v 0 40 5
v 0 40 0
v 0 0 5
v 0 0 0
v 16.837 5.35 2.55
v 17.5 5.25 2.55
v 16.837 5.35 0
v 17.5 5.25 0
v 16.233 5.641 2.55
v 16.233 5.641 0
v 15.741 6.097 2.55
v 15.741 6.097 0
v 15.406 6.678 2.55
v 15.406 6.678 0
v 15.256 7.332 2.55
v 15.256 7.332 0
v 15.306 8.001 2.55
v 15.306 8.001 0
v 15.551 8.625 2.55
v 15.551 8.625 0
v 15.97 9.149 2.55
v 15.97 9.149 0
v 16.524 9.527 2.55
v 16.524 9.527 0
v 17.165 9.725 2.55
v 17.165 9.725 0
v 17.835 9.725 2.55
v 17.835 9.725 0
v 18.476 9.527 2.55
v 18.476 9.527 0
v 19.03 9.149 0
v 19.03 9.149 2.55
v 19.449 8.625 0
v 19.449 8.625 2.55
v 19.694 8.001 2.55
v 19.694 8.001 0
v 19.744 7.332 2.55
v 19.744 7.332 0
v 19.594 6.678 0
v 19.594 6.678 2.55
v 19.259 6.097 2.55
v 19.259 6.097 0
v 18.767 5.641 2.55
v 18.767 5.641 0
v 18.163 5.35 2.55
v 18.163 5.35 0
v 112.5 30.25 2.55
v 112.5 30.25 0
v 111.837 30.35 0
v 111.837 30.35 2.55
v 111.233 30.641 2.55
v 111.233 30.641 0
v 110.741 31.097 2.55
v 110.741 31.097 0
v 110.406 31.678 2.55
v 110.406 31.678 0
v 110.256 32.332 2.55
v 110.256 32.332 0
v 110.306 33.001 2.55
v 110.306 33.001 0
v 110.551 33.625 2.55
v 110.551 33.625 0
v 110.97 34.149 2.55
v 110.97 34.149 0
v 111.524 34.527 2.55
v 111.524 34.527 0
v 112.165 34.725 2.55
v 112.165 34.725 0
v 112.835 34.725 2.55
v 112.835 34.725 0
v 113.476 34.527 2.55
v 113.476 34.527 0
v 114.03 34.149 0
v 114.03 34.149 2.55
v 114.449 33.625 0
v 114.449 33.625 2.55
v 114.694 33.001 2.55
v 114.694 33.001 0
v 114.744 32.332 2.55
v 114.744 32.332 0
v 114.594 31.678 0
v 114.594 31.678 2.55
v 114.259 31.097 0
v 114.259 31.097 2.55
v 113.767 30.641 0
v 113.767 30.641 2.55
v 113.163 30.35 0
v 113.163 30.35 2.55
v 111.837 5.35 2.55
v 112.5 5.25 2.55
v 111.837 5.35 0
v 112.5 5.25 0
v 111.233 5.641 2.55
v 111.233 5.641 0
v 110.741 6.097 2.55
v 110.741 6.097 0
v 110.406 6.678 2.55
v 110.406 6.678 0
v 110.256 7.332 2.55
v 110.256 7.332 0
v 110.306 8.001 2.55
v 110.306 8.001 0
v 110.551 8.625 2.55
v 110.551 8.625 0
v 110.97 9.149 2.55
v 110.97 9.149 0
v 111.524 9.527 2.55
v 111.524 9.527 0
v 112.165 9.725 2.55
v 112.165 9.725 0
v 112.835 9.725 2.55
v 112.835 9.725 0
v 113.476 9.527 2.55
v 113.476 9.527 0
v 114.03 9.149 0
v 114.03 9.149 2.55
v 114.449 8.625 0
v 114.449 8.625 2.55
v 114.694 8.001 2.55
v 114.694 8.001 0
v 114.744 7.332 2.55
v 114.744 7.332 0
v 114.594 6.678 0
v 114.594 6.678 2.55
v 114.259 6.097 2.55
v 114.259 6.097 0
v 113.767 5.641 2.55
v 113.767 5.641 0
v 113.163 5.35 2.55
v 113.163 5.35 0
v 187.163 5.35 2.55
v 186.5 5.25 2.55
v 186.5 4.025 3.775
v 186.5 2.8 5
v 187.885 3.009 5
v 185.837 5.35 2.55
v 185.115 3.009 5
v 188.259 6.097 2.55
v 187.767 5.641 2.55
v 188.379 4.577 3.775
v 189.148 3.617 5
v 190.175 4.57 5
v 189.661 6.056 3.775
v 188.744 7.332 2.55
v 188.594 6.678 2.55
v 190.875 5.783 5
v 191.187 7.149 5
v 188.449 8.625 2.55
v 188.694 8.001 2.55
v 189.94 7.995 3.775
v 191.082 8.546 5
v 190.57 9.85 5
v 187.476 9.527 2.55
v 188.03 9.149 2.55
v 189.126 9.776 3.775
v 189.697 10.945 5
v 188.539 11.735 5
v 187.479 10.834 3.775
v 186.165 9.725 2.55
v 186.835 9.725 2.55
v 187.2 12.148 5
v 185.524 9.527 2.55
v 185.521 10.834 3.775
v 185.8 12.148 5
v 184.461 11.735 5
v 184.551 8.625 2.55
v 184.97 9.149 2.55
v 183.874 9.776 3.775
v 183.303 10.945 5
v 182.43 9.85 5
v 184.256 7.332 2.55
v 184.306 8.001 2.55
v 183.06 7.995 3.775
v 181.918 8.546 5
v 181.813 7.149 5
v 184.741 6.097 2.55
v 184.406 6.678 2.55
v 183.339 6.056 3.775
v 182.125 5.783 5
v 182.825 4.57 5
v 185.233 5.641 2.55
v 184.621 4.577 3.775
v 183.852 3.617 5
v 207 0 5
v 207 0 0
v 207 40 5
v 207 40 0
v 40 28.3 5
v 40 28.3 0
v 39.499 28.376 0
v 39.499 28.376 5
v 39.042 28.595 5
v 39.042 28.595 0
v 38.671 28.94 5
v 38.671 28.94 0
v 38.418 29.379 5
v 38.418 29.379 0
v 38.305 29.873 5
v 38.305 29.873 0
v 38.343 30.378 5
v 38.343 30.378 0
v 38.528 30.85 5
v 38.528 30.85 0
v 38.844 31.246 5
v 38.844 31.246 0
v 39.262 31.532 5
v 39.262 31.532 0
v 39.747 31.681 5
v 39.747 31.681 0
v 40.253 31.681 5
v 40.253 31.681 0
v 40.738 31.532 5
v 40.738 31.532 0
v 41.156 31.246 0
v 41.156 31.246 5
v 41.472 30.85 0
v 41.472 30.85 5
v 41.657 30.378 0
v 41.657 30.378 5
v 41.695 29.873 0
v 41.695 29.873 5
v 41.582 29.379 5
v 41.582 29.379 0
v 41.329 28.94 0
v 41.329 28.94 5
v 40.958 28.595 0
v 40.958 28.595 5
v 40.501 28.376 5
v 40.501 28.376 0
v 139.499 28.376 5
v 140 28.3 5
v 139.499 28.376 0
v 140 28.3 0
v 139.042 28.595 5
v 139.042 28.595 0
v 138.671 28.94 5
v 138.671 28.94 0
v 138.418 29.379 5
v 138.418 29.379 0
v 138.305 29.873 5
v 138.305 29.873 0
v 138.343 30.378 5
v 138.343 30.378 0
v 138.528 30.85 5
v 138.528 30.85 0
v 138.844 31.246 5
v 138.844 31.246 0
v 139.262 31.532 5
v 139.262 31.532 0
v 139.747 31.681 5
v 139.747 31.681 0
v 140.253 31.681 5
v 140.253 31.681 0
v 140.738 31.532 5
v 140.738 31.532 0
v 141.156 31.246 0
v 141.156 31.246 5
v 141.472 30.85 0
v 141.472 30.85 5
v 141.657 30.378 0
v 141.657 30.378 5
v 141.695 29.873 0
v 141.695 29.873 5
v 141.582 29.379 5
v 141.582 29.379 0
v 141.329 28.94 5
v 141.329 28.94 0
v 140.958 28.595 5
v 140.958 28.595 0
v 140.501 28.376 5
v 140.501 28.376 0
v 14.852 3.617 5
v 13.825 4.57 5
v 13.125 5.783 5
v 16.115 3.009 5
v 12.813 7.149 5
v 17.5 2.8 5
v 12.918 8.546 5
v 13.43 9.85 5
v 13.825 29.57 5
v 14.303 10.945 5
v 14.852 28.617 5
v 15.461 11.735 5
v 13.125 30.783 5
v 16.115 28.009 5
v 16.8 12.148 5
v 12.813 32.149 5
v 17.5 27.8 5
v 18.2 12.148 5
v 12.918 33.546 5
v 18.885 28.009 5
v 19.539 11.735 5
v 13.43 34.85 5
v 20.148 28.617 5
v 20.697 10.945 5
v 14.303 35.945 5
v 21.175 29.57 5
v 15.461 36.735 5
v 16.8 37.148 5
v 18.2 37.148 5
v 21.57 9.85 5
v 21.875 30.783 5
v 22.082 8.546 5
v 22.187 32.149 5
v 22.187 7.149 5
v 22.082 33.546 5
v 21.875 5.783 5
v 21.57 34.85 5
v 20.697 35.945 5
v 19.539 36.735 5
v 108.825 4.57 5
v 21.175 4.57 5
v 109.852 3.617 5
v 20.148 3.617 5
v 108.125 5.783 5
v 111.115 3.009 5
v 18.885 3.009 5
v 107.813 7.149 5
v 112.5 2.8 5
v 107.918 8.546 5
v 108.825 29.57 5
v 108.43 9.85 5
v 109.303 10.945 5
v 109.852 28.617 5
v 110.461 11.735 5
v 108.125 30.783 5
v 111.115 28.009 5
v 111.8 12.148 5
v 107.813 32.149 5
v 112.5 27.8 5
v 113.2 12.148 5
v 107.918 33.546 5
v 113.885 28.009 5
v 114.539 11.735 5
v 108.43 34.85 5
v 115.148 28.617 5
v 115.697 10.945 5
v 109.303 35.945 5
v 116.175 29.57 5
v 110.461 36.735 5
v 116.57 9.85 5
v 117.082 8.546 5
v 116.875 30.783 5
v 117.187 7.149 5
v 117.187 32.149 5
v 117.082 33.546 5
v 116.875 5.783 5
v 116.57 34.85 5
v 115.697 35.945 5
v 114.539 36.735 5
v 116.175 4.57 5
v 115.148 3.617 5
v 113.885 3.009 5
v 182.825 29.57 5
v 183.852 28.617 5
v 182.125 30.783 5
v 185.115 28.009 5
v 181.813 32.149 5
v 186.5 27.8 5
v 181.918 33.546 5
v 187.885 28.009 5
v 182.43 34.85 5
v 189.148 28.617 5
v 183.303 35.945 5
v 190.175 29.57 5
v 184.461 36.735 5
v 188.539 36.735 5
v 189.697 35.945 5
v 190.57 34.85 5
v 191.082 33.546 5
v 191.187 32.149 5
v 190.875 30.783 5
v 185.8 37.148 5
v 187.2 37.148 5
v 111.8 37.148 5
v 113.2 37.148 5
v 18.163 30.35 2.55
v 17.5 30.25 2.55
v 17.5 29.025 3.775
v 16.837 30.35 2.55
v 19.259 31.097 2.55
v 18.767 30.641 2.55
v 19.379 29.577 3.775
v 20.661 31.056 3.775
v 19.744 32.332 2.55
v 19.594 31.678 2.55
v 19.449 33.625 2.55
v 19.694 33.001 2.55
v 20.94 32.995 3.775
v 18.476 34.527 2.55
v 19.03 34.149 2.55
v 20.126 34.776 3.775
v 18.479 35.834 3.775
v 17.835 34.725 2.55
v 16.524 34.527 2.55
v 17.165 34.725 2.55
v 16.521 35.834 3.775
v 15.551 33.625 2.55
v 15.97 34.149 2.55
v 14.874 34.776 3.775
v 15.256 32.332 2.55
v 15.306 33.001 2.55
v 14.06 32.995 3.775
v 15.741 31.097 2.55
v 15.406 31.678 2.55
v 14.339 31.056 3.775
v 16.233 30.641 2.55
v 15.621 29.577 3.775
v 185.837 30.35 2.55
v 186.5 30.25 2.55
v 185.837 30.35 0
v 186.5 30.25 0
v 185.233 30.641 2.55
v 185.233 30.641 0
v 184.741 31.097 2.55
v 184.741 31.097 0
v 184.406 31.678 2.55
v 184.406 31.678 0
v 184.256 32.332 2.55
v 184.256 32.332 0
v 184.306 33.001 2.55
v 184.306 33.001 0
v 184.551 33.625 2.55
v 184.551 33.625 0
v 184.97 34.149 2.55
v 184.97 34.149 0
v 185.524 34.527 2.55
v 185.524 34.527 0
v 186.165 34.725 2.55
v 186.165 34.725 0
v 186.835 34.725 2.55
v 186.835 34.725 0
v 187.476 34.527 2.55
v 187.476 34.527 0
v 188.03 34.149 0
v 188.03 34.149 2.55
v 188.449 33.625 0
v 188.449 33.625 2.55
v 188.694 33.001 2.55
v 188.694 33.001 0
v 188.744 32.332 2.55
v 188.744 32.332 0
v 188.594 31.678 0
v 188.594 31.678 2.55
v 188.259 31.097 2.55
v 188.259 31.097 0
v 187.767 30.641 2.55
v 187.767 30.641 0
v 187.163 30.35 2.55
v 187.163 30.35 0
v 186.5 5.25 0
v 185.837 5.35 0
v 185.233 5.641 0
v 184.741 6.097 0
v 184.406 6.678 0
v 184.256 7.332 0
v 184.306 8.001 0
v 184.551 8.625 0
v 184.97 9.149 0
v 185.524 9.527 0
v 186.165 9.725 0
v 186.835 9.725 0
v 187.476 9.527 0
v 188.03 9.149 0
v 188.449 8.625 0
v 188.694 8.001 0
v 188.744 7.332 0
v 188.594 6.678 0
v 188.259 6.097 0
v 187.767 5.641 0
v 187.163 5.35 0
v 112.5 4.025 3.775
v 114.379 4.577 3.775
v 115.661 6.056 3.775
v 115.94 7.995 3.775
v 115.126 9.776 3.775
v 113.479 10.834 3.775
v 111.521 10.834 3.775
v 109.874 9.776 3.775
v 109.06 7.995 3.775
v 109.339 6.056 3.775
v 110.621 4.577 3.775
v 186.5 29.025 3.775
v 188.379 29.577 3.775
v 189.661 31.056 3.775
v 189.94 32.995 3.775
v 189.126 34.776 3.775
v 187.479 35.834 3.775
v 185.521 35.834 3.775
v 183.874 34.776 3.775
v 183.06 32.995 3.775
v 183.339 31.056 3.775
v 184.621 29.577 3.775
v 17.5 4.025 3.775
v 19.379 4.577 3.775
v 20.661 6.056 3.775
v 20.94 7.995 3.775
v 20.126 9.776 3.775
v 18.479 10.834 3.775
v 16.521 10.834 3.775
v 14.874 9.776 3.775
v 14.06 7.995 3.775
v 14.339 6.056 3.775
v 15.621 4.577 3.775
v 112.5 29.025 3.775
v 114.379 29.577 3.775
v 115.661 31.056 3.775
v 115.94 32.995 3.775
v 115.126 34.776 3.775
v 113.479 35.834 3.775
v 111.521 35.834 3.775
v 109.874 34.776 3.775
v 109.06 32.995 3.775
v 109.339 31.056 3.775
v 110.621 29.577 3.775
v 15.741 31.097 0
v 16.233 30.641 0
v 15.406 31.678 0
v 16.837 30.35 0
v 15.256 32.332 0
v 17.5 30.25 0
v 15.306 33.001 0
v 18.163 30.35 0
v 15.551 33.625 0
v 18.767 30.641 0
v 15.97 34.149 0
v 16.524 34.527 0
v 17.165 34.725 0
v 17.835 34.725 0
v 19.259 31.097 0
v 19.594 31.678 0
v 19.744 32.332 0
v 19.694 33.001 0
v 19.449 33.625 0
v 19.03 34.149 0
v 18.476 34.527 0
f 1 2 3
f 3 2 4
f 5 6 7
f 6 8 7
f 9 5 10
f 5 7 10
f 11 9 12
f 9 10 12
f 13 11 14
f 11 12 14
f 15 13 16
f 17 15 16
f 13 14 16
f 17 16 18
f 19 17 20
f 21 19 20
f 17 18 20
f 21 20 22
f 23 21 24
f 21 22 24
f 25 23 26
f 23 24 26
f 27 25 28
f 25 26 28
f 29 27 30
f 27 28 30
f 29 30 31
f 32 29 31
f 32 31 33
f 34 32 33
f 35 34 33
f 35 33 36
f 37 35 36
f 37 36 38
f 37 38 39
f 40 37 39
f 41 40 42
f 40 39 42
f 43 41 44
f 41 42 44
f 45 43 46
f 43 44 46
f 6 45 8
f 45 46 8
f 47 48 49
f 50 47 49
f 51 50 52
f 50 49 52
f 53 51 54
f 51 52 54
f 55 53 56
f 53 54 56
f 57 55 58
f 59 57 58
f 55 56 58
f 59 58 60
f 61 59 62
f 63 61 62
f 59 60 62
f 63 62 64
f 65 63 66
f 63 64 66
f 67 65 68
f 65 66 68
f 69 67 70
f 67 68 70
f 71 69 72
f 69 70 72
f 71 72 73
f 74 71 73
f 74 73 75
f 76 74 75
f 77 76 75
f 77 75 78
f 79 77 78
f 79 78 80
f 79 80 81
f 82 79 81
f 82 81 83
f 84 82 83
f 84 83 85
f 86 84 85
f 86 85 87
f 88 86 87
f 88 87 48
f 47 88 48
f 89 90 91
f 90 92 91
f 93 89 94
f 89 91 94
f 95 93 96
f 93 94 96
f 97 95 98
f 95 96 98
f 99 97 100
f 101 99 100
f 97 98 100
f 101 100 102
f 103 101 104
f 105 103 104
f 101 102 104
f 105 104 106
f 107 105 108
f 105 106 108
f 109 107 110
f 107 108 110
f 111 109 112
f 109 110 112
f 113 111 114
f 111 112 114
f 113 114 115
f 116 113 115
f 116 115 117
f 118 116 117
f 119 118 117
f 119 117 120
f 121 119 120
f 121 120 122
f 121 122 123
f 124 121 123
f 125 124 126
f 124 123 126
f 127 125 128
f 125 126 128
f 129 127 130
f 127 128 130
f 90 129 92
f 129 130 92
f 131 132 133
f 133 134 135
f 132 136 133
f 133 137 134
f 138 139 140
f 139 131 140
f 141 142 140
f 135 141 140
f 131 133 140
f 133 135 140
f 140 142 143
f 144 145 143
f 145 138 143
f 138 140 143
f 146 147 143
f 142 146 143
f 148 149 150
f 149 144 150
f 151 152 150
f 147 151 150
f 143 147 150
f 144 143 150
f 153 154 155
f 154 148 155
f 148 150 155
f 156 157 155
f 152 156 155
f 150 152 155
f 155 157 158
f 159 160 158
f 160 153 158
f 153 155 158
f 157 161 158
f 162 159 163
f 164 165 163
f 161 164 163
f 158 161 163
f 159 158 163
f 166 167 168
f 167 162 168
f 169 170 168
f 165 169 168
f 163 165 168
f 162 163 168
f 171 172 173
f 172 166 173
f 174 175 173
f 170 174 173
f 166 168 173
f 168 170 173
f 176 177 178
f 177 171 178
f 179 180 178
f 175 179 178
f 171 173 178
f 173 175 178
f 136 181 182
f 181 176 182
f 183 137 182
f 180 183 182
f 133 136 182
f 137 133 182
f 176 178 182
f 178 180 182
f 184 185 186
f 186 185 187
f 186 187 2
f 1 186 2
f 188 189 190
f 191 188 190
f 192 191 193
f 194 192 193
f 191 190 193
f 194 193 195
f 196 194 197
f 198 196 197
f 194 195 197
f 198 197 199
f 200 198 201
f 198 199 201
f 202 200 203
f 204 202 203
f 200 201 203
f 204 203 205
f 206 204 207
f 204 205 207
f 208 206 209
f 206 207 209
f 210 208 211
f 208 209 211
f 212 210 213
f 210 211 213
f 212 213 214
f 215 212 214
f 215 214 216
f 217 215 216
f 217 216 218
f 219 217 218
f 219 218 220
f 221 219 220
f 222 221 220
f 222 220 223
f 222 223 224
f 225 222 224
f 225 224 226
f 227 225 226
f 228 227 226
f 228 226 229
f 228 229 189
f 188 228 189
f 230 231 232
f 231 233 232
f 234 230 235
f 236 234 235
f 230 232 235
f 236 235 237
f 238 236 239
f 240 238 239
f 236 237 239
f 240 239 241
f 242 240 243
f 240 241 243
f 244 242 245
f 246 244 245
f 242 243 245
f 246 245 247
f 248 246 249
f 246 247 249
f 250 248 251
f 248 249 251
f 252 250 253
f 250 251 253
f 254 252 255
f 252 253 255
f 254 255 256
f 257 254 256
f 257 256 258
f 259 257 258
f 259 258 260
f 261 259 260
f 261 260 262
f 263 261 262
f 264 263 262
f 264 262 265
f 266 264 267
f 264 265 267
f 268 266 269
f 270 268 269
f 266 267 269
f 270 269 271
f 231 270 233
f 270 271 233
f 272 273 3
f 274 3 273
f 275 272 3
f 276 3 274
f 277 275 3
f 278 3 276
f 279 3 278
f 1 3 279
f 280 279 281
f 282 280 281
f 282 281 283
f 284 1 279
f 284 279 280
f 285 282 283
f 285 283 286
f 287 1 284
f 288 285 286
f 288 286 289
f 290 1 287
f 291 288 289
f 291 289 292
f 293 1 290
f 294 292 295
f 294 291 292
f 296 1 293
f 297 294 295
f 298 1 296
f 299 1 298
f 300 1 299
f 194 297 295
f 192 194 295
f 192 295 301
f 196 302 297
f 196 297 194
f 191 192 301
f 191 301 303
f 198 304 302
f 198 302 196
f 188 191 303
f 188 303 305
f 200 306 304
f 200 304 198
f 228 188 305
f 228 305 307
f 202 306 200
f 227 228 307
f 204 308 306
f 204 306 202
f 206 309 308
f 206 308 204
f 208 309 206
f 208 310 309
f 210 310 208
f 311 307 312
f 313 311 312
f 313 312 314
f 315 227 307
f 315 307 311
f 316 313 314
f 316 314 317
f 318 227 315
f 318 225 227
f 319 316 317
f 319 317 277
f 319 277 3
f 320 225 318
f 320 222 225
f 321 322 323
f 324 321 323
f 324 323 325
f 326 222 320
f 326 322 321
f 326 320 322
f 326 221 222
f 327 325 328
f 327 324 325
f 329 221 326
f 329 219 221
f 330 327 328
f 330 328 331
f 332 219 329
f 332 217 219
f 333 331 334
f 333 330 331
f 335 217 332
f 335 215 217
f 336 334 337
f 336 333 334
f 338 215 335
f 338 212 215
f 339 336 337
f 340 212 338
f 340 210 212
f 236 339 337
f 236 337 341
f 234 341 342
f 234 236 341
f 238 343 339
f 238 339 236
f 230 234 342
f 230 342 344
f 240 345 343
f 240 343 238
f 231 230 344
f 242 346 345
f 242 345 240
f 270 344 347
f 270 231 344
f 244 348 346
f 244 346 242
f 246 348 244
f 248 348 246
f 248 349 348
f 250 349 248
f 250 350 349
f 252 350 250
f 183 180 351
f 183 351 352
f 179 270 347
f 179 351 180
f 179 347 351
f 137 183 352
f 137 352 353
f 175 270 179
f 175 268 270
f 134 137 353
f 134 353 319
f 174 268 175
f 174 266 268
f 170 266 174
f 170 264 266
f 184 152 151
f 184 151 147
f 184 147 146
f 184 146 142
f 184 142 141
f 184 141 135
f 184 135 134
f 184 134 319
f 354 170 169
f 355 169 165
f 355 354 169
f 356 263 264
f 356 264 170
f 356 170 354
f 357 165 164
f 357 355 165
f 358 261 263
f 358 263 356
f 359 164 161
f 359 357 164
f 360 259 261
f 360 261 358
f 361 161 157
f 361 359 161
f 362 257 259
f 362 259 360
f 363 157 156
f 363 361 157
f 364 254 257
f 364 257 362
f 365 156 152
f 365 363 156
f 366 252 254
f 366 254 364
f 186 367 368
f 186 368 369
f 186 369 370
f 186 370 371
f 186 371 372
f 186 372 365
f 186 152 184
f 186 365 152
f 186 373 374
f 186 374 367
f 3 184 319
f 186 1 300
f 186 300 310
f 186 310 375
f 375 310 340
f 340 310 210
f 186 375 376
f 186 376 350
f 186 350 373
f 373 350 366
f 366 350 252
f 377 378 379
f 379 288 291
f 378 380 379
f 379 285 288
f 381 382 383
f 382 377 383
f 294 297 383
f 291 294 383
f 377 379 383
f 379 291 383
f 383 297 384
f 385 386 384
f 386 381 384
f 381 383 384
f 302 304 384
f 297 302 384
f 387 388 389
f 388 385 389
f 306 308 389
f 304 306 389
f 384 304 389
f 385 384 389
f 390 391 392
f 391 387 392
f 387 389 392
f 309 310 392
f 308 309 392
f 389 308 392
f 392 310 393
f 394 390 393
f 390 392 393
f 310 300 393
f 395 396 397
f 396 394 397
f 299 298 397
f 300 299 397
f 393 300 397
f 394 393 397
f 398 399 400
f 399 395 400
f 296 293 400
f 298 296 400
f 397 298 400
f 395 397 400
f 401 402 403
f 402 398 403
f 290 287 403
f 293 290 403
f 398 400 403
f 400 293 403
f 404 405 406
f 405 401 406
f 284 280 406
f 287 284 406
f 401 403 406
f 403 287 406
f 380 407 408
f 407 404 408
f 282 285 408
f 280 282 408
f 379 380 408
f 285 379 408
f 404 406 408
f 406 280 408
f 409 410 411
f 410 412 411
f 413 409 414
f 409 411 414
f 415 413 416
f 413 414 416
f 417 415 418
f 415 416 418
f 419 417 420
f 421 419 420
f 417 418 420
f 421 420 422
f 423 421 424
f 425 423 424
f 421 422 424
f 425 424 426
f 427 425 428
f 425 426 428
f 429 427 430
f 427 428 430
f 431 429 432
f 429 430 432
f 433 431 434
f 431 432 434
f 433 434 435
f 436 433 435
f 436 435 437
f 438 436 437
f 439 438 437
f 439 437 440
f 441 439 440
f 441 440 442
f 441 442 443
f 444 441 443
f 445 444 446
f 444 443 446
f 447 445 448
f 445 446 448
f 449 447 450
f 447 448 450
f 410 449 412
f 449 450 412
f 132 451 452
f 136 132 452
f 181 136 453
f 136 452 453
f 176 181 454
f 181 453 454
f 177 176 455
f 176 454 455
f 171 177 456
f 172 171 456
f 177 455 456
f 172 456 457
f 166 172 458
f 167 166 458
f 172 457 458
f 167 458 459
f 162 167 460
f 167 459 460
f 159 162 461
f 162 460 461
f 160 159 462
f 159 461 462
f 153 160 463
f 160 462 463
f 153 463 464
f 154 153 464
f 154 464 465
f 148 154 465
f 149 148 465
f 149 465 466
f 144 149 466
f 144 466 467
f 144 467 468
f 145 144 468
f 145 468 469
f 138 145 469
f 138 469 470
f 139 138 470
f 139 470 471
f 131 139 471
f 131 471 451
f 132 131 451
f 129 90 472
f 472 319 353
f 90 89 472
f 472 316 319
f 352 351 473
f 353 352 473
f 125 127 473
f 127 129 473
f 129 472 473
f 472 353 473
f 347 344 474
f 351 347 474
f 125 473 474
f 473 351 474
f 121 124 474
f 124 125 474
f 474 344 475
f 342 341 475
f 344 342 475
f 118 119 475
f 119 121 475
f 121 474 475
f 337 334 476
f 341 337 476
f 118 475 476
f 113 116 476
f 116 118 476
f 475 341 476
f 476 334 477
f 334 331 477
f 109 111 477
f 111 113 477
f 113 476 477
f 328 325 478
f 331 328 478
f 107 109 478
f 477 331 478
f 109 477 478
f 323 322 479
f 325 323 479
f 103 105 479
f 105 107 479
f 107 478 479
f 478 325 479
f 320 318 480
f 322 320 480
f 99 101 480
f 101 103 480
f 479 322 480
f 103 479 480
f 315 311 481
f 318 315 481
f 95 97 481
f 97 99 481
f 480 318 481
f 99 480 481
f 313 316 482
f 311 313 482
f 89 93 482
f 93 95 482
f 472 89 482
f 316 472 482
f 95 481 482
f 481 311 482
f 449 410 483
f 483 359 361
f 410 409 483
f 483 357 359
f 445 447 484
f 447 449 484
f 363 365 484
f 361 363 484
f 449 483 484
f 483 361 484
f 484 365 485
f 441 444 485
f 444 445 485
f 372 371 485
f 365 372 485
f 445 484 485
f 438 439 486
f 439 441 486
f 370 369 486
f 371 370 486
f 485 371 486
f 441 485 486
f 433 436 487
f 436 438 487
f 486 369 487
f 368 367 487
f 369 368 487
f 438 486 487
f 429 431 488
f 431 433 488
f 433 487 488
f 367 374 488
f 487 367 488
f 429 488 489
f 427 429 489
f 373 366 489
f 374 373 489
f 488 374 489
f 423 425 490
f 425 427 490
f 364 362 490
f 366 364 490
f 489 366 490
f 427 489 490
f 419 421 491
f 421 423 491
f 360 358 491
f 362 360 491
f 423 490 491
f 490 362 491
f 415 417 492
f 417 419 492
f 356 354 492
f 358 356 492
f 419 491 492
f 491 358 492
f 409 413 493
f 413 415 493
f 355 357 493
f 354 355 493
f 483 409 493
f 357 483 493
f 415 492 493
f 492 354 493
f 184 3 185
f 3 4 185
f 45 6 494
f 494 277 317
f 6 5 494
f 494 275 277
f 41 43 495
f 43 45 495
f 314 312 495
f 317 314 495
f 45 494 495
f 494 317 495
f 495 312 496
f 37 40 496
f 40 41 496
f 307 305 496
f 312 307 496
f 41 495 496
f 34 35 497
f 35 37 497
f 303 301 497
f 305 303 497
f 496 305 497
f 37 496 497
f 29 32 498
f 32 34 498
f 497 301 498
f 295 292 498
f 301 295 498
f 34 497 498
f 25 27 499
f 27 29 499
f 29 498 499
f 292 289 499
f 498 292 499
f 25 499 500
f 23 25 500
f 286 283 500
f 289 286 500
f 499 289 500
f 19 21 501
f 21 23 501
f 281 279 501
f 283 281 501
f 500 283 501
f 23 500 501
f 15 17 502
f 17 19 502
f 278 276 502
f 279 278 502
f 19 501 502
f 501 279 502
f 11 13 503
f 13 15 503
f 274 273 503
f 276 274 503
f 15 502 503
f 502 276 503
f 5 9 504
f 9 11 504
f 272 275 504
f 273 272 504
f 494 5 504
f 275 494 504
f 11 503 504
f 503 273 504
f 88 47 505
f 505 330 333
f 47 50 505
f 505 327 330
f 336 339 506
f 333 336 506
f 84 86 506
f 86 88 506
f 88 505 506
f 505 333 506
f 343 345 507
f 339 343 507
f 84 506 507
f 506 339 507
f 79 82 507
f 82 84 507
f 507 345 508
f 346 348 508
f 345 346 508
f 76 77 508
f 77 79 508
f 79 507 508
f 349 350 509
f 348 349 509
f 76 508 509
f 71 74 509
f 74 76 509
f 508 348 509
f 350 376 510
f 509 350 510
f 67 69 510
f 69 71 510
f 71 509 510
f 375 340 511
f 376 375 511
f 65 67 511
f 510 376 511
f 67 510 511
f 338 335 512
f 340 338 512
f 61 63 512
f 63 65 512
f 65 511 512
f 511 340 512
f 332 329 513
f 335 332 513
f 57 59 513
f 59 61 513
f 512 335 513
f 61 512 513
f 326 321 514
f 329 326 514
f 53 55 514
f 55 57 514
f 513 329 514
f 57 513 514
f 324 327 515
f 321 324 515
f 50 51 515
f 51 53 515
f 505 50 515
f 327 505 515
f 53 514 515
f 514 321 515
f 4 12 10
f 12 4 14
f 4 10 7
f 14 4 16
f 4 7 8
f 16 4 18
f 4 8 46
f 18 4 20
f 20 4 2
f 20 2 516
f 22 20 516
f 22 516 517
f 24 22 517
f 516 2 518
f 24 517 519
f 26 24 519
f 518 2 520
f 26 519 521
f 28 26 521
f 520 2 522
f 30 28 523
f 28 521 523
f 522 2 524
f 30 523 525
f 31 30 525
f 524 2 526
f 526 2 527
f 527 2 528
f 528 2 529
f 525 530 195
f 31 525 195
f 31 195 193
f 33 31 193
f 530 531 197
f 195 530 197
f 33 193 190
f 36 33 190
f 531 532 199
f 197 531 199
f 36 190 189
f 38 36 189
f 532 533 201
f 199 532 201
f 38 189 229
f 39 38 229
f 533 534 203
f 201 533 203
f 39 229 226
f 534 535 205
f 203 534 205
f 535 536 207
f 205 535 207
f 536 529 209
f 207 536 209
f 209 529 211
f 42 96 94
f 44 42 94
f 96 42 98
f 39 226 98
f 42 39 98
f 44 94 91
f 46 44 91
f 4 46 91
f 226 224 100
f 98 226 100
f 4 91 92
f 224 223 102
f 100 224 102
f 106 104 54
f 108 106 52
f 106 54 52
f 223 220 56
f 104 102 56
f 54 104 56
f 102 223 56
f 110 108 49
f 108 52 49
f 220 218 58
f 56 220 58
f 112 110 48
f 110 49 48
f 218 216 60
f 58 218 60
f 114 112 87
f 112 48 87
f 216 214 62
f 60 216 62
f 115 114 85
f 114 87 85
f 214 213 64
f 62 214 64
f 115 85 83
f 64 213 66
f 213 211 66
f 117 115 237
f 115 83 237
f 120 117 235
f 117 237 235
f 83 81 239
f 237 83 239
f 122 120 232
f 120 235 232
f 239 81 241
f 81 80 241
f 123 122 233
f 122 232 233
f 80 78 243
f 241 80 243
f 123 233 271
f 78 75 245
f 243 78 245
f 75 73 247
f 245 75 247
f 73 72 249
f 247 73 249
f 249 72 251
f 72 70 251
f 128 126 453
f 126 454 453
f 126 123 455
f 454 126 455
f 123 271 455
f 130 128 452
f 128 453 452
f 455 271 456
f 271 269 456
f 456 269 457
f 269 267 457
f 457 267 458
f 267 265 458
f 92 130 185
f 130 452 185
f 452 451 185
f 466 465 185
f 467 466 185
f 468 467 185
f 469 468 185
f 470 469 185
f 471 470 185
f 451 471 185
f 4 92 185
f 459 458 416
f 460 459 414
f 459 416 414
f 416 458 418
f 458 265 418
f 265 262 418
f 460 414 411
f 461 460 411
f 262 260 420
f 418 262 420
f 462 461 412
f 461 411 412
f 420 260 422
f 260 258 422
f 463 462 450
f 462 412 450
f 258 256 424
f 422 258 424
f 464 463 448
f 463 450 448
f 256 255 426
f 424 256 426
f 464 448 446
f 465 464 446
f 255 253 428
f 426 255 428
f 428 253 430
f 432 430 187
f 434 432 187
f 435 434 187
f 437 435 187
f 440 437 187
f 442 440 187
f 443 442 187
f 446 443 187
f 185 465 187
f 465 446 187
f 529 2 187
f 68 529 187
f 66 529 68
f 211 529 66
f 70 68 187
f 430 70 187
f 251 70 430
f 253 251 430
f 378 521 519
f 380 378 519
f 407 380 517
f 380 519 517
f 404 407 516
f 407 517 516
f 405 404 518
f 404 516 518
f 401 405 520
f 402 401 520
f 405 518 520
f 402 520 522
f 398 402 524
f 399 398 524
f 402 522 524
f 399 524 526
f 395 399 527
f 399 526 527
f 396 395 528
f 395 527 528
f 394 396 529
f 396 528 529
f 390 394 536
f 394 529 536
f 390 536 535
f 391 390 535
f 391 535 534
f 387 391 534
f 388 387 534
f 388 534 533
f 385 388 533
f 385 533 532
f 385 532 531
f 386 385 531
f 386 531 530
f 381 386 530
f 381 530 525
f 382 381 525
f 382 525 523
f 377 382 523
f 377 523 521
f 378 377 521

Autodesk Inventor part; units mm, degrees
ref_plane "YZ Plane" through (0, 0, 0) normal (1, 0, 0) x (0, 1, 0)
ref_plane "XZ Plane" through (0, 0, 0) normal (0, 1, 0) x (-1, 0, 0)
ref_plane "XY Plane" through (0, 0, 0) normal (0, 0, 1) x (1, 0, 0)
sketch "Sketch1" plane through (0, 0, 0) normal (0, 0, 1) x (1, 0, 0)
  line L0 (0, 0) -> (207, 0)
  line L1 (207, 0) -> (207, 40)
  line L2 (207, 40) -> (0, 40)
  line L3 (0, 40) -> (0, 0)
  dimension "d0" = 207
  dimension "d1" = 40
extrude "Extrusion1" add sketch "Sketch1" along normal blind 5
sketch "Sketch2" plane through (0, 0, 5) normal (0, 0, 1) x (1, 0, 0)
  line L0 (207, 40) -> (0, 40) projected
  line L1 (0, 0) -> (207, 0) projected
  line L2 (0, 40) -> (0, 0) projected
  point P0 (17.5, 32.5)
  point P1 (17.5, 7.5)
  point P2 (112.5, 32.5)
  point P3 (112.5, 7.5)
  point P4 (186.5, 32.5)
  point P5 (186.5, 7.5)
  dimension "d4" = 7.5
  dimension "d5" = 7.5
  dimension "d6" = 17.5
  dimension "d7" = 95
  dimension "d8" = 74
hole "Hole1" at (17.5, 32.5, 5) at (17.5, 7.5, 5) at (112.5, 32.5, 5) at (112.5, 7.5, 5) at (186.5, 32.5, 5) at (186.5, 7.5, 5) direction (0, 0, -1) diameter 4.5 end through all countersink diameter 9.4 countersink angle 90 clearance for "Flat Head Machine Screw" size "M4" standard "Ansi Metric M Profile"
sketch "Sketch3" plane through (0, 0, 5) normal (0, 0, 1) x (1, 0, 0)
  line L0 (0, 40) -> (0, 0) projected
  line L1 (0, 0) -> (207, 0) projected
  circle A0 centre (186.5, 7.5) radius 4.7 projected
  point P0 (159, 32)
  dimension "d17" = 32
  dimension "d25" = 27.5
hole "Hole2" [suppressed]
sketch "Sketch4" plane through (0, 0, 5) normal (0, 0, 1) x (1, 0, 0)
  line L0 (207, 40) -> (0, 40) projected
  line L1 (0, 40) -> (0, 0) projected
  point P0 (40, 30)
  point P1 (140, 30)
  dimension "d26" = 100
  dimension "d27" = 10
  dimension "d28" = 40
hole "Hole3" at (40, 30, 5) at (140, 30, 5) direction (0, 0, -1) diameter 3.4 end through all clearance for "Flat Head Machine Screw" size "M3" standard "Ansi Metric M Profile"
equation "\"d5\" = d4"
properties part number "Top_Slider Piece 3" material "Wood (Oak)"
